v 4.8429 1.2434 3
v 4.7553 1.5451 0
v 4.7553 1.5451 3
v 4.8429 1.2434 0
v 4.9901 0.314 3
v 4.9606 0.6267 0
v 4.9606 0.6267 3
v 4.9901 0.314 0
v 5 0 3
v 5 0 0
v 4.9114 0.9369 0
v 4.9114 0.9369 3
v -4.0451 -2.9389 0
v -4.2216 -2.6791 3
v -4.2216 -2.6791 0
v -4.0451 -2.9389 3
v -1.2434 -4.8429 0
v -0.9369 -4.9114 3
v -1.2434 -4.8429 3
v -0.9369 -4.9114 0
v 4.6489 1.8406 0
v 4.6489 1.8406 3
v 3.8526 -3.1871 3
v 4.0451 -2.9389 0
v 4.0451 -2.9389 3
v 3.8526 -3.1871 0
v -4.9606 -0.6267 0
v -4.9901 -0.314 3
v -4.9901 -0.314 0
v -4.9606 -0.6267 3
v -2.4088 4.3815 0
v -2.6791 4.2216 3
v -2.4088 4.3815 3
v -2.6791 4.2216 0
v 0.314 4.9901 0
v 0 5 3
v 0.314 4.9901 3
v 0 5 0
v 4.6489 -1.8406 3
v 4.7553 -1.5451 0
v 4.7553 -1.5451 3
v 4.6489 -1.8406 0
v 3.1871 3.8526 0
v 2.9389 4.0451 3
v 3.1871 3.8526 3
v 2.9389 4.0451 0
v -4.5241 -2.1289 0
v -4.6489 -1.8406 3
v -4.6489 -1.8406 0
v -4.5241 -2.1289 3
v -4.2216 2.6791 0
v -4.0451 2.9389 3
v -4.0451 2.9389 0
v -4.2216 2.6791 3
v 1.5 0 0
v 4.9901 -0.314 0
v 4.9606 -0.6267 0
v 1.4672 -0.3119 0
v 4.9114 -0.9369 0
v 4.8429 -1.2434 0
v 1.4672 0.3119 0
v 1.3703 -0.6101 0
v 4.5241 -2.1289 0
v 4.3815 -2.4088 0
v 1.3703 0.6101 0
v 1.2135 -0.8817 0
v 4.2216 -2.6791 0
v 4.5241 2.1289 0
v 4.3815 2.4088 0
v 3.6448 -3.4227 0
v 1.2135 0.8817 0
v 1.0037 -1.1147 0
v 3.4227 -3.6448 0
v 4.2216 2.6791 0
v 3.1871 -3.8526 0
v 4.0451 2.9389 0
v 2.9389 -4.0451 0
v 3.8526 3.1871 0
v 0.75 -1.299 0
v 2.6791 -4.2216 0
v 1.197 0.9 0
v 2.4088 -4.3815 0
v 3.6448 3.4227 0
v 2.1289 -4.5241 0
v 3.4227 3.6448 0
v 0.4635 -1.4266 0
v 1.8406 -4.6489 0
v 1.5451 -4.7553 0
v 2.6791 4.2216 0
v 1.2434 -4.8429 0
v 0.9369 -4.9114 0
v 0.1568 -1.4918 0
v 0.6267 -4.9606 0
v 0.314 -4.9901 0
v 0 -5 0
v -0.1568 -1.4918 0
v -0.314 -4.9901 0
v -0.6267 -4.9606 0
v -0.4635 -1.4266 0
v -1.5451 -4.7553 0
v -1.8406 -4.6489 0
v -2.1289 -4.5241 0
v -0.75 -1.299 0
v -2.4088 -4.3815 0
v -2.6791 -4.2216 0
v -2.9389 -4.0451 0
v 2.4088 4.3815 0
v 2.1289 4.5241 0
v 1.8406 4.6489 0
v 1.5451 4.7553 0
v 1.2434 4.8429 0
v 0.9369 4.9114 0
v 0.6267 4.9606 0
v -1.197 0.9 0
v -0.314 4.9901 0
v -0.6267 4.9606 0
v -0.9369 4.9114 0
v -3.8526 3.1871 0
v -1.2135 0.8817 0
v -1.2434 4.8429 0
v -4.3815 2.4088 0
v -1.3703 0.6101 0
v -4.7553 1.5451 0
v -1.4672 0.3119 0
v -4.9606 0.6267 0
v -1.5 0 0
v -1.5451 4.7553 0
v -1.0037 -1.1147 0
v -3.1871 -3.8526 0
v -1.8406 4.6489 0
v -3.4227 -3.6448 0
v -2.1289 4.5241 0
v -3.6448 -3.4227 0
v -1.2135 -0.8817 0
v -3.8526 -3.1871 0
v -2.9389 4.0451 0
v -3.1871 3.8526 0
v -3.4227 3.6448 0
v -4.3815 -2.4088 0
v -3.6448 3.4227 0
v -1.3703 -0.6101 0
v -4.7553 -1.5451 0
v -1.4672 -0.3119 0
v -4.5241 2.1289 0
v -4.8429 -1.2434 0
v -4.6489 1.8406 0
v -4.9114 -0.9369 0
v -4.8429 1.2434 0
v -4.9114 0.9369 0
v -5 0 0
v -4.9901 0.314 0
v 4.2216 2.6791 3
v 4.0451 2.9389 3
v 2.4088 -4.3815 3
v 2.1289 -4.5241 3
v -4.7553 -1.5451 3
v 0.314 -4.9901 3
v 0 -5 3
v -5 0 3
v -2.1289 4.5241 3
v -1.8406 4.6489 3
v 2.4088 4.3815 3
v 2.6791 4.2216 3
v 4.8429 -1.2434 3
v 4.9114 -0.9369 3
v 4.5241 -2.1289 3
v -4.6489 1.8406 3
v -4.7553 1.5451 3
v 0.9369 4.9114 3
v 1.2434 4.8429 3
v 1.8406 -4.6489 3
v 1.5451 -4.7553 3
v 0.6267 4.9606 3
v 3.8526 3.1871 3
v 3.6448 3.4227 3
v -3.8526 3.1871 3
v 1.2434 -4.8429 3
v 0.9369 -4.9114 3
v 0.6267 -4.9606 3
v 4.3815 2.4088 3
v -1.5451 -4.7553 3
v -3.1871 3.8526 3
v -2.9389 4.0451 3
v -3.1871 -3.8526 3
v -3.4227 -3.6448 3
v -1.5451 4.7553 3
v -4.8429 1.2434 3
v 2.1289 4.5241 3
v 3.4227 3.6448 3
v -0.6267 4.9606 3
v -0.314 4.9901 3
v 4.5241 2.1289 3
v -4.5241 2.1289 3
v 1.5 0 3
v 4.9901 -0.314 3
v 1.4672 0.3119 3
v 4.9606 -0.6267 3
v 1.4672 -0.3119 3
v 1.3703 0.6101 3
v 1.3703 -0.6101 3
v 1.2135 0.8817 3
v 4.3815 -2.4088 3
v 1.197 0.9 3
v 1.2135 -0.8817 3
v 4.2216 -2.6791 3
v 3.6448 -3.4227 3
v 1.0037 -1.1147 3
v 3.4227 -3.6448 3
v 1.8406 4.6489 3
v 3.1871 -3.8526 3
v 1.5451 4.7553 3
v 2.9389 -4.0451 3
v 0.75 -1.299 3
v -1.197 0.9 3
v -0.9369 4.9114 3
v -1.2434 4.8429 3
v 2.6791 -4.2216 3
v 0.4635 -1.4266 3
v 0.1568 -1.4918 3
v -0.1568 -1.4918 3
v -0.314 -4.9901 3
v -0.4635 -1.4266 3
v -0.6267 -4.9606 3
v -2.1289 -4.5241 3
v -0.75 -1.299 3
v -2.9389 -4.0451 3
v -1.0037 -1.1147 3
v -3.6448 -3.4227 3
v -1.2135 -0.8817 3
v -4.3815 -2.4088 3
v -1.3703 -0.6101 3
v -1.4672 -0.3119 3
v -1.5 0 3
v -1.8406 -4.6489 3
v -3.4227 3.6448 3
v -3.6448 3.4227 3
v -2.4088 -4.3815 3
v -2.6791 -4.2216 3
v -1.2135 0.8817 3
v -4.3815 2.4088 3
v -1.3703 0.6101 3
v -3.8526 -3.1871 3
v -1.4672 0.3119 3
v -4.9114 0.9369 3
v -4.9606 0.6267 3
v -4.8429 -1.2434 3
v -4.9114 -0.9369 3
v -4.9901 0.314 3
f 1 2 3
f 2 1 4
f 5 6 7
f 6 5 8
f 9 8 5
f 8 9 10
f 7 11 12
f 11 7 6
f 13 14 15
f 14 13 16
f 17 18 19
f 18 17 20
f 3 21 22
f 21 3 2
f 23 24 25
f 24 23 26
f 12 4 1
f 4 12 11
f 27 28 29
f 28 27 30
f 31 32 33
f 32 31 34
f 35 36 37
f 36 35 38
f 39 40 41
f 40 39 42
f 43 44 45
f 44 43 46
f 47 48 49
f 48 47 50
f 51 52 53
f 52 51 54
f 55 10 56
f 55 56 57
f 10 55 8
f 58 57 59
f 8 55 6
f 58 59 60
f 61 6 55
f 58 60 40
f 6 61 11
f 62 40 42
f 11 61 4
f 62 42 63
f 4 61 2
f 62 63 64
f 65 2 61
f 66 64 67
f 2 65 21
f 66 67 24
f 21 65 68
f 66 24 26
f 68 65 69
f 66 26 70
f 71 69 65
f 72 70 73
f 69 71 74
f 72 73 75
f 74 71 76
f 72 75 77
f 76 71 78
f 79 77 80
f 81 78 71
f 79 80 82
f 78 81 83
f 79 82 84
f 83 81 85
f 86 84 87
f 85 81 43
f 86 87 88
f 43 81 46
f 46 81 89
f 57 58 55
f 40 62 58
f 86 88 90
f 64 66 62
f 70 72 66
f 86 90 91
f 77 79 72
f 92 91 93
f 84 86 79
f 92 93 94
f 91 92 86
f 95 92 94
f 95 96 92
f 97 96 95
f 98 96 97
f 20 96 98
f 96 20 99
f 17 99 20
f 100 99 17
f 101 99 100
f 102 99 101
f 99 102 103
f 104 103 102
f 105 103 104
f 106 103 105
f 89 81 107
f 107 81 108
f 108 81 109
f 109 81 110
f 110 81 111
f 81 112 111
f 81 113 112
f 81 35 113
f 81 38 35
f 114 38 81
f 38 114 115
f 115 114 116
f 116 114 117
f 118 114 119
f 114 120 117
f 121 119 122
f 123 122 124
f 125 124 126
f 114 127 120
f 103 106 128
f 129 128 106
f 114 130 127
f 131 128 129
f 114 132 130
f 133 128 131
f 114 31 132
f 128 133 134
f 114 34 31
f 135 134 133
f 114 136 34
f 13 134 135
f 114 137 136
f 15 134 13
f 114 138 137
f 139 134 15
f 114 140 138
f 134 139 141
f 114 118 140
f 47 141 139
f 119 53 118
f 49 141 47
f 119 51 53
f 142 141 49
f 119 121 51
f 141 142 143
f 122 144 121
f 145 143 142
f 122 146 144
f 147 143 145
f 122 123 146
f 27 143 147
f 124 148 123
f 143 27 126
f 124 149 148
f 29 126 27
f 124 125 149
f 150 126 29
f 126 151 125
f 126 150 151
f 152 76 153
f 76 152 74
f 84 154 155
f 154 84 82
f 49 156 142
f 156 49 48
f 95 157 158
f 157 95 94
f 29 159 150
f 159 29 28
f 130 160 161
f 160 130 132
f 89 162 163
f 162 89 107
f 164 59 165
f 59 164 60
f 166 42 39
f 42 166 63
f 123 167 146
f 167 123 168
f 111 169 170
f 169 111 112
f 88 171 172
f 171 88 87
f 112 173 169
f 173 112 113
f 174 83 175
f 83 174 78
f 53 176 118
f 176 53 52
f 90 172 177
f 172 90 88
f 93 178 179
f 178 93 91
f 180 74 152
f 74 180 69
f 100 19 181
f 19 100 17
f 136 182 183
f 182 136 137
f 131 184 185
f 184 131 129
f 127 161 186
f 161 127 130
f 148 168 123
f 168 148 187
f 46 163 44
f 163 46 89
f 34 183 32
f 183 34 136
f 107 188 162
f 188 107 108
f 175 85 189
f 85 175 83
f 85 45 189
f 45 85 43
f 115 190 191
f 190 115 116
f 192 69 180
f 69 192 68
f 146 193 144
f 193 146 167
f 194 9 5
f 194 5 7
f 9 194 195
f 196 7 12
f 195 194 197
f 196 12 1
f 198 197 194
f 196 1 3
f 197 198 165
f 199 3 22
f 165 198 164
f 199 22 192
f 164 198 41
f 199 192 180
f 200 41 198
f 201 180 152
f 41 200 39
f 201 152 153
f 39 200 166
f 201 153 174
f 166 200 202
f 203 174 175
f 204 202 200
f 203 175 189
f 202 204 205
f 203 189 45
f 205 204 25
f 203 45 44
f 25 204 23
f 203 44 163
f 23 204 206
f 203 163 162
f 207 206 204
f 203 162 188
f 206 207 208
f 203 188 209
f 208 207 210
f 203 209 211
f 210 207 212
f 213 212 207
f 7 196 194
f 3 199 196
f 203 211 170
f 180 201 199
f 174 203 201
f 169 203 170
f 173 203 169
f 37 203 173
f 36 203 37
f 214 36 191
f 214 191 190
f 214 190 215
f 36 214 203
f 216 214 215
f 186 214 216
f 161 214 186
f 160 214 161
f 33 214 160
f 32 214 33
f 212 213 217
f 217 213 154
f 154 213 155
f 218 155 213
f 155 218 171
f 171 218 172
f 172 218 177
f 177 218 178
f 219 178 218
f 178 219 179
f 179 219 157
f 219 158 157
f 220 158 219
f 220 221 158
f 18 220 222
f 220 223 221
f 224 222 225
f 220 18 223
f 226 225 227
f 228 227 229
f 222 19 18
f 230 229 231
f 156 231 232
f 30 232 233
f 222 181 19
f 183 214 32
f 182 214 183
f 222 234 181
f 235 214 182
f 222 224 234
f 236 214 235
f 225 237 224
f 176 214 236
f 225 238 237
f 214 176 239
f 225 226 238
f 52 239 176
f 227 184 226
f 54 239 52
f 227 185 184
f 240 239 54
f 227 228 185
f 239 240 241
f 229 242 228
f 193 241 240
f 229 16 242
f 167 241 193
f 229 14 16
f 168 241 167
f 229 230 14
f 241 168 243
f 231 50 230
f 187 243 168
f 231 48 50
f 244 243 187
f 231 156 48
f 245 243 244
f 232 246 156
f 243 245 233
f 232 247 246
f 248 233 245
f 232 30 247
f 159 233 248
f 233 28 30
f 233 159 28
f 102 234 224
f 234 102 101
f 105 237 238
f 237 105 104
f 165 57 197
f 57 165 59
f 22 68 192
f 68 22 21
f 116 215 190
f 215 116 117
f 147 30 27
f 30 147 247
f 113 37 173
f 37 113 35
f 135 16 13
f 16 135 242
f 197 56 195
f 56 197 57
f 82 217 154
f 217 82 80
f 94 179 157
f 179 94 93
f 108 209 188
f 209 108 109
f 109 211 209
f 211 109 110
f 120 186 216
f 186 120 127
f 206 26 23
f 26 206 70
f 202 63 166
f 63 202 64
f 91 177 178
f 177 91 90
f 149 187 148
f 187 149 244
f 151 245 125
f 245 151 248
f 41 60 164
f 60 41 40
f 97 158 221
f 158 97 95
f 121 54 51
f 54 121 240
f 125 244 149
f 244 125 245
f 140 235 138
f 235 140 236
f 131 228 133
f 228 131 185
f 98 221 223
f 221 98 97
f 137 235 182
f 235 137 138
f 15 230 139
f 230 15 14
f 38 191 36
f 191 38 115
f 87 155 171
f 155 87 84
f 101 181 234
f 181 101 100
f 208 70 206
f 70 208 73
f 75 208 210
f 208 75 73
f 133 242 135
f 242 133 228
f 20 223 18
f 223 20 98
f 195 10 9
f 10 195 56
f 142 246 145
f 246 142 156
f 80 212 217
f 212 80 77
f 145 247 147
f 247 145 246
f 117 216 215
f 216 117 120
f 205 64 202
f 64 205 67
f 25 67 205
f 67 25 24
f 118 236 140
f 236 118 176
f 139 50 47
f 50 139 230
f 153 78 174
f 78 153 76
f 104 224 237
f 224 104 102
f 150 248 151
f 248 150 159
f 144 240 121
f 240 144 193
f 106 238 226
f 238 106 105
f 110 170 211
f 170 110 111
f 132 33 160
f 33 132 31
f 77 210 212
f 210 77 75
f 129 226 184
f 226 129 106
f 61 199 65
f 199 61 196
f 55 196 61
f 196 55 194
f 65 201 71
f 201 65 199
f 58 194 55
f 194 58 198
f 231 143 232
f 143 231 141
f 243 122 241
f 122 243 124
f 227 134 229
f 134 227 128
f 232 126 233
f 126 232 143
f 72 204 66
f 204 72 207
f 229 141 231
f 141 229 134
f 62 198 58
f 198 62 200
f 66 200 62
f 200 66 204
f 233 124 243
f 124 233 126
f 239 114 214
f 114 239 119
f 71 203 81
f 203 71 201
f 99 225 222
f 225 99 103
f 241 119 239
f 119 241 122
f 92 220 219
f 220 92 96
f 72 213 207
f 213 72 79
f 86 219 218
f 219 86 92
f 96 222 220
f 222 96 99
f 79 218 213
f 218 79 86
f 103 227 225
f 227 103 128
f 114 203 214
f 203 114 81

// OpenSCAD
diameter=5;
height=3;

center_diameter=3;
barre=0.6;


difference() {
	cylinder(h = height, r = diameter, center = false, $fn=100);
    cylinder(h = height, r = center_diameter/2, center = false, $fn=30);    
}
translate([-center_diameter/2,center_diameter/2-barre,0]) {
    cube(size=[center_diameter, center_diameter,height], center=false);
}
